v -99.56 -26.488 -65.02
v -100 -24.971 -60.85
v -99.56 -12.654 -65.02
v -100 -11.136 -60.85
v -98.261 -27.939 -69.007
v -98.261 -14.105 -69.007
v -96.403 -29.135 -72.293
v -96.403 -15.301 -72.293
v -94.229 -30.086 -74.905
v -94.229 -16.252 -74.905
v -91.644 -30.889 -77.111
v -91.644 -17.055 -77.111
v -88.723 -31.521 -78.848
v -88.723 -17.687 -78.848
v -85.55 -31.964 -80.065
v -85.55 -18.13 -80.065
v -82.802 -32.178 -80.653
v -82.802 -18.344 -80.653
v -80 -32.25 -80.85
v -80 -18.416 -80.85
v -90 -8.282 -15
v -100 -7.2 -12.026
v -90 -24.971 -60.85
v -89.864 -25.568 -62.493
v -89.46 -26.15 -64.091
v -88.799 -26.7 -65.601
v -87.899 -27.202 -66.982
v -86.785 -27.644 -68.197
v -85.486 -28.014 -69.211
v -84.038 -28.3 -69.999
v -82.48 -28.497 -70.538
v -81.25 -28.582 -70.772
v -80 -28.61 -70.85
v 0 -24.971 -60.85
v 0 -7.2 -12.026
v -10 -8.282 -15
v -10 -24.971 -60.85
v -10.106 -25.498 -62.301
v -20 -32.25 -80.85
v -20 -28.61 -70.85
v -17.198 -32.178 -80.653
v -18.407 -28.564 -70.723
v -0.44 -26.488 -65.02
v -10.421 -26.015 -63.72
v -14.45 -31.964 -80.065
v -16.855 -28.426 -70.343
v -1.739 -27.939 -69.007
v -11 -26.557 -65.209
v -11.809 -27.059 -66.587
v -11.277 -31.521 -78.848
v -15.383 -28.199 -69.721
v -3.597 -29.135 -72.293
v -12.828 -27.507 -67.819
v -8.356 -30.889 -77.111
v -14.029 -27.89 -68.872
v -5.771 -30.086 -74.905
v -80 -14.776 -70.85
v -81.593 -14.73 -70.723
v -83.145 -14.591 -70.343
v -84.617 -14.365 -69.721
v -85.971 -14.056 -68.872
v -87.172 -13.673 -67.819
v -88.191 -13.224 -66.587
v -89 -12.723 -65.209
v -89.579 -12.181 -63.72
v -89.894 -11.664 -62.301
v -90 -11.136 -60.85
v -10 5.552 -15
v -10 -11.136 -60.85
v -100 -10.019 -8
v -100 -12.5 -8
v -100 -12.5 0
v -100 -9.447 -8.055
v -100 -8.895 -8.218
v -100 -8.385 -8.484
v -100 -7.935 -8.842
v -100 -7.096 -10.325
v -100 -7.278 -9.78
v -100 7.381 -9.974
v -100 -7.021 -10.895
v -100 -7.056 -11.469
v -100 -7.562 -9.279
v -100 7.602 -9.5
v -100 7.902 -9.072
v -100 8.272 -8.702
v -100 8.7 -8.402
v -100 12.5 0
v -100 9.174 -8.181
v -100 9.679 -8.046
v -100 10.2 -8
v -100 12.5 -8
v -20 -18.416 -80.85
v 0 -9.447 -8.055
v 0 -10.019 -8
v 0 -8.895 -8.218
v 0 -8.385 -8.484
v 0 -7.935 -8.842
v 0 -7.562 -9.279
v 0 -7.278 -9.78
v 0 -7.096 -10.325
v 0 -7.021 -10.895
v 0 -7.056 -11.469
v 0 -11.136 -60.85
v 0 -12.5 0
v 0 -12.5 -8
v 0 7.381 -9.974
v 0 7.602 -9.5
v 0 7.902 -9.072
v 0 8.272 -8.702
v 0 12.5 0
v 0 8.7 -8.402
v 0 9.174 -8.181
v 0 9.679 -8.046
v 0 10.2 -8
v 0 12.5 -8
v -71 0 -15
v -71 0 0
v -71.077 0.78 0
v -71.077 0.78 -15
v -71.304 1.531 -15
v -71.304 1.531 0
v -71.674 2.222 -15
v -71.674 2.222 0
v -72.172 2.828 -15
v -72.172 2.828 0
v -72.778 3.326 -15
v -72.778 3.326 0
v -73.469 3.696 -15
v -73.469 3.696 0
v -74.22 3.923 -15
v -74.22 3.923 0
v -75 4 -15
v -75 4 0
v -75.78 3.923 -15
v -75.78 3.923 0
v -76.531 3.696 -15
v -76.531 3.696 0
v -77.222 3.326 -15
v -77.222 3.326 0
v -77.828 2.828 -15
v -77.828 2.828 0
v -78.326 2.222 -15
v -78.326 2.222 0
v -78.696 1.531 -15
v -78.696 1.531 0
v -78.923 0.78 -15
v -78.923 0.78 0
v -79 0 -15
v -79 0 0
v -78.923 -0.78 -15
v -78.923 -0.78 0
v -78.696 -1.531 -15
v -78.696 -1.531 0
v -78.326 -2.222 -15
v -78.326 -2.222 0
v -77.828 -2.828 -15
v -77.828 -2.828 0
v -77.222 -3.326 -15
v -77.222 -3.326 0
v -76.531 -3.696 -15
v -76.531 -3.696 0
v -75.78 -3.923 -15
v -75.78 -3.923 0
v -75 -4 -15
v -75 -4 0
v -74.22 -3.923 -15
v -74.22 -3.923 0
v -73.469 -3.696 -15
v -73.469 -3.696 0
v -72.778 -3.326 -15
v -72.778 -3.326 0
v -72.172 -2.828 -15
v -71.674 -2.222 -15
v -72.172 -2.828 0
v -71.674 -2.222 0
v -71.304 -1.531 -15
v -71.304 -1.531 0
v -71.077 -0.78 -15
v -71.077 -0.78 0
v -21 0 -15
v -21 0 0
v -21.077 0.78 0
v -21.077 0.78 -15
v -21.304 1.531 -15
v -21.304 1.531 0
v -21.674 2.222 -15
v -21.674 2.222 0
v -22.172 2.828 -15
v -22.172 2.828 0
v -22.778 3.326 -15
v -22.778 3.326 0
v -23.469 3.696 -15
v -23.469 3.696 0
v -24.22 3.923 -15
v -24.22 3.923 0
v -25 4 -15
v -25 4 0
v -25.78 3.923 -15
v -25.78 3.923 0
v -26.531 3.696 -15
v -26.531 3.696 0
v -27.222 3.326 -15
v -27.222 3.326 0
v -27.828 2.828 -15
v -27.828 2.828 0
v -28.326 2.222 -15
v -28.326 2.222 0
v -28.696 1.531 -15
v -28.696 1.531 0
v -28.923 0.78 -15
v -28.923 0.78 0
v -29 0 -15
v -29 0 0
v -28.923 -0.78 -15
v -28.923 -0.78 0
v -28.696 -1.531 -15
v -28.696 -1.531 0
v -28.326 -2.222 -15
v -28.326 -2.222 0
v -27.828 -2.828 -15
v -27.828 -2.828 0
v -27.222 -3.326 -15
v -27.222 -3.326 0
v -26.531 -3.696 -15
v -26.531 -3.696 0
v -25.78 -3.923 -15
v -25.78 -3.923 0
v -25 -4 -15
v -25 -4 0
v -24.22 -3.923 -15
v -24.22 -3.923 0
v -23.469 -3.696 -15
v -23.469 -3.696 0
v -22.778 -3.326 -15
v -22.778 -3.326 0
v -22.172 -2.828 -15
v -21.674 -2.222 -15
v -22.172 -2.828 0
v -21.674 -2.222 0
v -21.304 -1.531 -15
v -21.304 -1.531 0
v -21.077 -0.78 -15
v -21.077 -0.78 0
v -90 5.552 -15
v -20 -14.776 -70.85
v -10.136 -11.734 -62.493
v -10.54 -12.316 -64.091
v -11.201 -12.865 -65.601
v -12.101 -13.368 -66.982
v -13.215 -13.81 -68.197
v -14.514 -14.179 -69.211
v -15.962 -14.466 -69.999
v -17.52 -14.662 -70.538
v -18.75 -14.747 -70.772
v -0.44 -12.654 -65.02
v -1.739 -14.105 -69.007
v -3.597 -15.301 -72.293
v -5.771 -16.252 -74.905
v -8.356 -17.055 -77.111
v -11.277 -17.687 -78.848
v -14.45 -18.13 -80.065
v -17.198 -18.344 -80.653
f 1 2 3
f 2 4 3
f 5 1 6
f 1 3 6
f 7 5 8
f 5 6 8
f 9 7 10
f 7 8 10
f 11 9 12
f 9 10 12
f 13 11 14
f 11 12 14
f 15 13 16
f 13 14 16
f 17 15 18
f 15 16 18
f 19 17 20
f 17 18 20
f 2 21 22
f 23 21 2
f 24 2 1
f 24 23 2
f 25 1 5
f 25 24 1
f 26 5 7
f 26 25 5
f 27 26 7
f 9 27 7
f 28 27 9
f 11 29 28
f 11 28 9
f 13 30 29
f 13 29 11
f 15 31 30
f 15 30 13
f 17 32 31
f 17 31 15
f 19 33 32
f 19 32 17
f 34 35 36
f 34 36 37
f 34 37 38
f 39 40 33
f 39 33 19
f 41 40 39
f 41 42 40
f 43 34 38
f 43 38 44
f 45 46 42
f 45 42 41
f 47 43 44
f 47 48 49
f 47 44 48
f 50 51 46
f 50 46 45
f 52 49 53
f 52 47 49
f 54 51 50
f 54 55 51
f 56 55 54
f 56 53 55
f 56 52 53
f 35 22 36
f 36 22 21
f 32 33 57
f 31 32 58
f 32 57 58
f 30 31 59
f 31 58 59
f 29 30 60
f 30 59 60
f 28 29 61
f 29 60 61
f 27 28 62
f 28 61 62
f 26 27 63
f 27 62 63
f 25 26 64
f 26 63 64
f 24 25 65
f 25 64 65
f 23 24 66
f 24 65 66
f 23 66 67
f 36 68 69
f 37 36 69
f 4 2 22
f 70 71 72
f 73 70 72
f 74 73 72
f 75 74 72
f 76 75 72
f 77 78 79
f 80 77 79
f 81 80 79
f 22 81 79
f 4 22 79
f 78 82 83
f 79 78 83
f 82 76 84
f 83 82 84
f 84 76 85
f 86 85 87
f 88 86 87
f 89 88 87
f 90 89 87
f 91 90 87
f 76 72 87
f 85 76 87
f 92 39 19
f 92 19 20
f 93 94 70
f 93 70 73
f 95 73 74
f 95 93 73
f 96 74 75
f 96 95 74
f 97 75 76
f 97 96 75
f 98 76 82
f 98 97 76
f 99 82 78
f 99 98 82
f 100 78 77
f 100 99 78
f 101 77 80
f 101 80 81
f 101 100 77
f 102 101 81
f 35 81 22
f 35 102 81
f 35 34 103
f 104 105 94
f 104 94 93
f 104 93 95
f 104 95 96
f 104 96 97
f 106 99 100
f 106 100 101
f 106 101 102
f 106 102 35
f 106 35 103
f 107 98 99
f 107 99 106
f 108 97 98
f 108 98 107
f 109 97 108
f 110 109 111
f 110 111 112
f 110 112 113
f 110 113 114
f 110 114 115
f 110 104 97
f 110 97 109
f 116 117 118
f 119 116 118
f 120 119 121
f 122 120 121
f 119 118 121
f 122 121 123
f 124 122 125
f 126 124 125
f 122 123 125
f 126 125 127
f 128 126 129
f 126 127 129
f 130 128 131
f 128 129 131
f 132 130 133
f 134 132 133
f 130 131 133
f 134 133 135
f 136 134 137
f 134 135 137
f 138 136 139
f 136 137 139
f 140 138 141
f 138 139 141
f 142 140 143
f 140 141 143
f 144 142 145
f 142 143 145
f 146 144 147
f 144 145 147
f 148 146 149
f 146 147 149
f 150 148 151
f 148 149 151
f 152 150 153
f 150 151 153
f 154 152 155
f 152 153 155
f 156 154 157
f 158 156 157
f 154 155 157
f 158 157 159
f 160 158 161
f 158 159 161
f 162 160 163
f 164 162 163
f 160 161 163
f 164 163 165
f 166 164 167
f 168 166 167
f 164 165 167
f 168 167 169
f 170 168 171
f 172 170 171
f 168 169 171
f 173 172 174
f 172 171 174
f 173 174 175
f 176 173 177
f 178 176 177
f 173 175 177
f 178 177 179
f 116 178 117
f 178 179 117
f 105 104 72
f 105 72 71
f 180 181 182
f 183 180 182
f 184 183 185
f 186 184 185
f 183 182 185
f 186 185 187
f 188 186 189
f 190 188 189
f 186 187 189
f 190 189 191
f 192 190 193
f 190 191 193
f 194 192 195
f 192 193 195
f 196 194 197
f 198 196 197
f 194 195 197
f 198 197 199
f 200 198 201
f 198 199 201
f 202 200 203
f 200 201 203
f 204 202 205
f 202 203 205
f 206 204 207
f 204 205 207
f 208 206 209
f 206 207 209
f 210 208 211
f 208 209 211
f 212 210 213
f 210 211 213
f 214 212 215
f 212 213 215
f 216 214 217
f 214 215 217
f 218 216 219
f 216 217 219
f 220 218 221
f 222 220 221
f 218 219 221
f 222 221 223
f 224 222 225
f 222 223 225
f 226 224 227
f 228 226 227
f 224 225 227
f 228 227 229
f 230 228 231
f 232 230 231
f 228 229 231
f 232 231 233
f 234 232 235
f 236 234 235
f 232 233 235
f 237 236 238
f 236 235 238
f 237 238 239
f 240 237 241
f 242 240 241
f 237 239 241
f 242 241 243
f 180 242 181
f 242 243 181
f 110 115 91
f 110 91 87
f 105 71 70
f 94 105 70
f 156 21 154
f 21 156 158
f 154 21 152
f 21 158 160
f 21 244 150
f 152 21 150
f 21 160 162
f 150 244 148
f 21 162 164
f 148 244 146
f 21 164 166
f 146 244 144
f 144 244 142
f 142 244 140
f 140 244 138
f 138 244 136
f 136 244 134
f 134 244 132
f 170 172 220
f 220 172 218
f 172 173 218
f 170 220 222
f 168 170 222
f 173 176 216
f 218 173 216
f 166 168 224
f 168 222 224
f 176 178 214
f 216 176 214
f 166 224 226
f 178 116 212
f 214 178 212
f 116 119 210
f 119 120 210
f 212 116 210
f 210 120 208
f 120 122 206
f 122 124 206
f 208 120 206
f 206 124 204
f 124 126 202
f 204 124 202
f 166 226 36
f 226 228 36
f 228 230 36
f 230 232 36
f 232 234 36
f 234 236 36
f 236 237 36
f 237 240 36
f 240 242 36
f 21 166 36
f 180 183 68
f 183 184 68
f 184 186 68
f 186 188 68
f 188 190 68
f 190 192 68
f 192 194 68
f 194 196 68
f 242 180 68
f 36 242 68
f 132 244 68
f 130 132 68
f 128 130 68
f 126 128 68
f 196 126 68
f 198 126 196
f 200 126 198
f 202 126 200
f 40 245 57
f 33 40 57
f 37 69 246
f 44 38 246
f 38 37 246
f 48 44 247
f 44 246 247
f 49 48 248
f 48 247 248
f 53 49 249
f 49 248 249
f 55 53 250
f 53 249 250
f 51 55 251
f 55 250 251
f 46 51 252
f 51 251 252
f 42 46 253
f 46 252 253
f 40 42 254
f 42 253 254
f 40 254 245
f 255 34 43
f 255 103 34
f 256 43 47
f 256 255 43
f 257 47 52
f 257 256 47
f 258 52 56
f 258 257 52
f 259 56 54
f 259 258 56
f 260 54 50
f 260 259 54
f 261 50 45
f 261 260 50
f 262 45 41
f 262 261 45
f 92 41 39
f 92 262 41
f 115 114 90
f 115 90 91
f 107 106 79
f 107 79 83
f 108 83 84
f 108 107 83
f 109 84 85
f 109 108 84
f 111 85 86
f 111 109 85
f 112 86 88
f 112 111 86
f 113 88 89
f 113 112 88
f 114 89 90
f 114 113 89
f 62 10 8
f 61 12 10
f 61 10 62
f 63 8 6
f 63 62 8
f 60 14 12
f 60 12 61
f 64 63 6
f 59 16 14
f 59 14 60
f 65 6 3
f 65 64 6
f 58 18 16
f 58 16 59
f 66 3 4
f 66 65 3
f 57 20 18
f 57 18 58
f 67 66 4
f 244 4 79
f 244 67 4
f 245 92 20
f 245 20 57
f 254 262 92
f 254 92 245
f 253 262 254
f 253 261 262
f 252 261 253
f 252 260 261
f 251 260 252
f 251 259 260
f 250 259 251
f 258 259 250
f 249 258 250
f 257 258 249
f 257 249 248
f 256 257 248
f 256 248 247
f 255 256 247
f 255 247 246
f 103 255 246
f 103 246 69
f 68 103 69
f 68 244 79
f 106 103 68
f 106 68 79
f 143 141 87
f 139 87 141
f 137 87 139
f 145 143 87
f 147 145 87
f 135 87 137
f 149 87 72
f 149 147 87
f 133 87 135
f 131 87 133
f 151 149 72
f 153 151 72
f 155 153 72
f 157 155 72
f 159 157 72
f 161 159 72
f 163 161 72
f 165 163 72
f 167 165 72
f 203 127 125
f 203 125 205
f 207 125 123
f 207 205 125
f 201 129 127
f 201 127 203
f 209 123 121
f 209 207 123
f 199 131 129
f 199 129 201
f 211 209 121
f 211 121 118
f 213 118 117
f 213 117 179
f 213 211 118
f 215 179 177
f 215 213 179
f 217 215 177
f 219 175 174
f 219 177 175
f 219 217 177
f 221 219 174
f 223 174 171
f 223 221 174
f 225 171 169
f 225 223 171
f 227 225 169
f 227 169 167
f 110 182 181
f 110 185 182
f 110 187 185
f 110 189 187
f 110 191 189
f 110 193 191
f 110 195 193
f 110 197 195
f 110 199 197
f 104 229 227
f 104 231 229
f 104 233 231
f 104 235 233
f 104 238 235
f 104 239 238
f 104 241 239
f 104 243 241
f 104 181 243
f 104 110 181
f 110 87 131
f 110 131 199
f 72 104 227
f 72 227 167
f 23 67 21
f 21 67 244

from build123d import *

# Parameters (mm, degrees)
BOSS_EXTRUDE1_DEPTH = 100
CUT_EXTRUDE3_REACH  = 138.159
FILLET2_R           = 20
SKETCH6_R           = 4
CUT_EXTRUDE4_DEPTH  = 15


with BuildPart() as part:
    # Sketch1 → Boss-Extrude1 (new body)
    with BuildSketch(Plane.YZ):
        with BuildLine():
            Line((-12.5, 0), (-12.5, -8))
            Line((-12.5, -8), (-10.019077862, -8))
            ThreePointArc((-10.019077862, -8), (-7.561621729, -9.279270691), (-7.2, -12.02606043))
            Line((-7.2, -12.02606043), (-32.25, -80.850369787))
            Line((-32.25, -80.850369787), (-18.415688958, -80.850369787))
            Line((-18.415688958, -80.850369787), (7.381221952, -9.97393957))
            ThreePointArc((7.381221952, -9.97393957), (8.479570506, -8.542543867), (10.200299815, -8))
            Line((10.200299815, -8), (12.5, -8))
            Line((12.5, -8), (12.5, 0))
            Line((12.5, 0), (-12.5, 0))
        make_face()
    extrude(amount=-BOSS_EXTRUDE1_DEPTH)

    # Cut-Extrude3: up to this plane
    cut_extrude3_end = Plane(origin=(-100, -7.2, -12.02606043), z_dir=(0, -0.9396926207859074, 0.34202014332567165))
    # Sketch5 → Cut-Extrude3 (cut, up to the surface)
    with BuildSketch(Plane(origin=(0, 12.5, 0), x_dir=(-1, 0, 0), z_dir=(0, 1, 0)), mode=Mode.PRIVATE) as cut_extrude3_sk1:
        with BuildLine():
            Line((10, -15), (10, -60.850369787))
            ThreePointArc((10, -60.850369787), (12.928932188, -67.921437599), (20, -70.850369787))
            Line((20, -70.850369787), (80, -70.850369787))
            ThreePointArc((80, -70.850369787), (87.071067812, -67.921437599), (90, -60.850369787))
            Line((90, -60.850369787), (90, -15))
            Line((90, -15), (10, -15))
        make_face()
    cut_extrude3_tool1 = split(extrude(cut_extrude3_sk1.sketch, amount=-CUT_EXTRUDE3_REACH, mode=Mode.PRIVATE), bisect_by=cut_extrude3_end, keep=Keep.BOTH, mode=Mode.PRIVATE)
    add(cut_extrude3_tool1.solids().sort_by_distance((-50, 12.5, -42.675996))[0], mode=Mode.SUBTRACT)

    # Fillet2
    fillet2_edges = [part.edges().sort_by_distance(p)[0] for p in [
        (0, -25.332844479, -80.850369787),
        (-100, -25.332844479, -80.850369787),
    ]]
    fillet(fillet2_edges, radius=FILLET2_R)

    # Sketch6 → Cut-Extrude4 (cut)
    with BuildSketch(Plane.XY):
        with Locations((-75, 0)):
            Circle(SKETCH6_R)
        with Locations((-25, 0)):
            Circle(SKETCH6_R)
    extrude(amount=-CUT_EXTRUDE4_DEPTH, mode=Mode.SUBTRACT)


solid = part.part
